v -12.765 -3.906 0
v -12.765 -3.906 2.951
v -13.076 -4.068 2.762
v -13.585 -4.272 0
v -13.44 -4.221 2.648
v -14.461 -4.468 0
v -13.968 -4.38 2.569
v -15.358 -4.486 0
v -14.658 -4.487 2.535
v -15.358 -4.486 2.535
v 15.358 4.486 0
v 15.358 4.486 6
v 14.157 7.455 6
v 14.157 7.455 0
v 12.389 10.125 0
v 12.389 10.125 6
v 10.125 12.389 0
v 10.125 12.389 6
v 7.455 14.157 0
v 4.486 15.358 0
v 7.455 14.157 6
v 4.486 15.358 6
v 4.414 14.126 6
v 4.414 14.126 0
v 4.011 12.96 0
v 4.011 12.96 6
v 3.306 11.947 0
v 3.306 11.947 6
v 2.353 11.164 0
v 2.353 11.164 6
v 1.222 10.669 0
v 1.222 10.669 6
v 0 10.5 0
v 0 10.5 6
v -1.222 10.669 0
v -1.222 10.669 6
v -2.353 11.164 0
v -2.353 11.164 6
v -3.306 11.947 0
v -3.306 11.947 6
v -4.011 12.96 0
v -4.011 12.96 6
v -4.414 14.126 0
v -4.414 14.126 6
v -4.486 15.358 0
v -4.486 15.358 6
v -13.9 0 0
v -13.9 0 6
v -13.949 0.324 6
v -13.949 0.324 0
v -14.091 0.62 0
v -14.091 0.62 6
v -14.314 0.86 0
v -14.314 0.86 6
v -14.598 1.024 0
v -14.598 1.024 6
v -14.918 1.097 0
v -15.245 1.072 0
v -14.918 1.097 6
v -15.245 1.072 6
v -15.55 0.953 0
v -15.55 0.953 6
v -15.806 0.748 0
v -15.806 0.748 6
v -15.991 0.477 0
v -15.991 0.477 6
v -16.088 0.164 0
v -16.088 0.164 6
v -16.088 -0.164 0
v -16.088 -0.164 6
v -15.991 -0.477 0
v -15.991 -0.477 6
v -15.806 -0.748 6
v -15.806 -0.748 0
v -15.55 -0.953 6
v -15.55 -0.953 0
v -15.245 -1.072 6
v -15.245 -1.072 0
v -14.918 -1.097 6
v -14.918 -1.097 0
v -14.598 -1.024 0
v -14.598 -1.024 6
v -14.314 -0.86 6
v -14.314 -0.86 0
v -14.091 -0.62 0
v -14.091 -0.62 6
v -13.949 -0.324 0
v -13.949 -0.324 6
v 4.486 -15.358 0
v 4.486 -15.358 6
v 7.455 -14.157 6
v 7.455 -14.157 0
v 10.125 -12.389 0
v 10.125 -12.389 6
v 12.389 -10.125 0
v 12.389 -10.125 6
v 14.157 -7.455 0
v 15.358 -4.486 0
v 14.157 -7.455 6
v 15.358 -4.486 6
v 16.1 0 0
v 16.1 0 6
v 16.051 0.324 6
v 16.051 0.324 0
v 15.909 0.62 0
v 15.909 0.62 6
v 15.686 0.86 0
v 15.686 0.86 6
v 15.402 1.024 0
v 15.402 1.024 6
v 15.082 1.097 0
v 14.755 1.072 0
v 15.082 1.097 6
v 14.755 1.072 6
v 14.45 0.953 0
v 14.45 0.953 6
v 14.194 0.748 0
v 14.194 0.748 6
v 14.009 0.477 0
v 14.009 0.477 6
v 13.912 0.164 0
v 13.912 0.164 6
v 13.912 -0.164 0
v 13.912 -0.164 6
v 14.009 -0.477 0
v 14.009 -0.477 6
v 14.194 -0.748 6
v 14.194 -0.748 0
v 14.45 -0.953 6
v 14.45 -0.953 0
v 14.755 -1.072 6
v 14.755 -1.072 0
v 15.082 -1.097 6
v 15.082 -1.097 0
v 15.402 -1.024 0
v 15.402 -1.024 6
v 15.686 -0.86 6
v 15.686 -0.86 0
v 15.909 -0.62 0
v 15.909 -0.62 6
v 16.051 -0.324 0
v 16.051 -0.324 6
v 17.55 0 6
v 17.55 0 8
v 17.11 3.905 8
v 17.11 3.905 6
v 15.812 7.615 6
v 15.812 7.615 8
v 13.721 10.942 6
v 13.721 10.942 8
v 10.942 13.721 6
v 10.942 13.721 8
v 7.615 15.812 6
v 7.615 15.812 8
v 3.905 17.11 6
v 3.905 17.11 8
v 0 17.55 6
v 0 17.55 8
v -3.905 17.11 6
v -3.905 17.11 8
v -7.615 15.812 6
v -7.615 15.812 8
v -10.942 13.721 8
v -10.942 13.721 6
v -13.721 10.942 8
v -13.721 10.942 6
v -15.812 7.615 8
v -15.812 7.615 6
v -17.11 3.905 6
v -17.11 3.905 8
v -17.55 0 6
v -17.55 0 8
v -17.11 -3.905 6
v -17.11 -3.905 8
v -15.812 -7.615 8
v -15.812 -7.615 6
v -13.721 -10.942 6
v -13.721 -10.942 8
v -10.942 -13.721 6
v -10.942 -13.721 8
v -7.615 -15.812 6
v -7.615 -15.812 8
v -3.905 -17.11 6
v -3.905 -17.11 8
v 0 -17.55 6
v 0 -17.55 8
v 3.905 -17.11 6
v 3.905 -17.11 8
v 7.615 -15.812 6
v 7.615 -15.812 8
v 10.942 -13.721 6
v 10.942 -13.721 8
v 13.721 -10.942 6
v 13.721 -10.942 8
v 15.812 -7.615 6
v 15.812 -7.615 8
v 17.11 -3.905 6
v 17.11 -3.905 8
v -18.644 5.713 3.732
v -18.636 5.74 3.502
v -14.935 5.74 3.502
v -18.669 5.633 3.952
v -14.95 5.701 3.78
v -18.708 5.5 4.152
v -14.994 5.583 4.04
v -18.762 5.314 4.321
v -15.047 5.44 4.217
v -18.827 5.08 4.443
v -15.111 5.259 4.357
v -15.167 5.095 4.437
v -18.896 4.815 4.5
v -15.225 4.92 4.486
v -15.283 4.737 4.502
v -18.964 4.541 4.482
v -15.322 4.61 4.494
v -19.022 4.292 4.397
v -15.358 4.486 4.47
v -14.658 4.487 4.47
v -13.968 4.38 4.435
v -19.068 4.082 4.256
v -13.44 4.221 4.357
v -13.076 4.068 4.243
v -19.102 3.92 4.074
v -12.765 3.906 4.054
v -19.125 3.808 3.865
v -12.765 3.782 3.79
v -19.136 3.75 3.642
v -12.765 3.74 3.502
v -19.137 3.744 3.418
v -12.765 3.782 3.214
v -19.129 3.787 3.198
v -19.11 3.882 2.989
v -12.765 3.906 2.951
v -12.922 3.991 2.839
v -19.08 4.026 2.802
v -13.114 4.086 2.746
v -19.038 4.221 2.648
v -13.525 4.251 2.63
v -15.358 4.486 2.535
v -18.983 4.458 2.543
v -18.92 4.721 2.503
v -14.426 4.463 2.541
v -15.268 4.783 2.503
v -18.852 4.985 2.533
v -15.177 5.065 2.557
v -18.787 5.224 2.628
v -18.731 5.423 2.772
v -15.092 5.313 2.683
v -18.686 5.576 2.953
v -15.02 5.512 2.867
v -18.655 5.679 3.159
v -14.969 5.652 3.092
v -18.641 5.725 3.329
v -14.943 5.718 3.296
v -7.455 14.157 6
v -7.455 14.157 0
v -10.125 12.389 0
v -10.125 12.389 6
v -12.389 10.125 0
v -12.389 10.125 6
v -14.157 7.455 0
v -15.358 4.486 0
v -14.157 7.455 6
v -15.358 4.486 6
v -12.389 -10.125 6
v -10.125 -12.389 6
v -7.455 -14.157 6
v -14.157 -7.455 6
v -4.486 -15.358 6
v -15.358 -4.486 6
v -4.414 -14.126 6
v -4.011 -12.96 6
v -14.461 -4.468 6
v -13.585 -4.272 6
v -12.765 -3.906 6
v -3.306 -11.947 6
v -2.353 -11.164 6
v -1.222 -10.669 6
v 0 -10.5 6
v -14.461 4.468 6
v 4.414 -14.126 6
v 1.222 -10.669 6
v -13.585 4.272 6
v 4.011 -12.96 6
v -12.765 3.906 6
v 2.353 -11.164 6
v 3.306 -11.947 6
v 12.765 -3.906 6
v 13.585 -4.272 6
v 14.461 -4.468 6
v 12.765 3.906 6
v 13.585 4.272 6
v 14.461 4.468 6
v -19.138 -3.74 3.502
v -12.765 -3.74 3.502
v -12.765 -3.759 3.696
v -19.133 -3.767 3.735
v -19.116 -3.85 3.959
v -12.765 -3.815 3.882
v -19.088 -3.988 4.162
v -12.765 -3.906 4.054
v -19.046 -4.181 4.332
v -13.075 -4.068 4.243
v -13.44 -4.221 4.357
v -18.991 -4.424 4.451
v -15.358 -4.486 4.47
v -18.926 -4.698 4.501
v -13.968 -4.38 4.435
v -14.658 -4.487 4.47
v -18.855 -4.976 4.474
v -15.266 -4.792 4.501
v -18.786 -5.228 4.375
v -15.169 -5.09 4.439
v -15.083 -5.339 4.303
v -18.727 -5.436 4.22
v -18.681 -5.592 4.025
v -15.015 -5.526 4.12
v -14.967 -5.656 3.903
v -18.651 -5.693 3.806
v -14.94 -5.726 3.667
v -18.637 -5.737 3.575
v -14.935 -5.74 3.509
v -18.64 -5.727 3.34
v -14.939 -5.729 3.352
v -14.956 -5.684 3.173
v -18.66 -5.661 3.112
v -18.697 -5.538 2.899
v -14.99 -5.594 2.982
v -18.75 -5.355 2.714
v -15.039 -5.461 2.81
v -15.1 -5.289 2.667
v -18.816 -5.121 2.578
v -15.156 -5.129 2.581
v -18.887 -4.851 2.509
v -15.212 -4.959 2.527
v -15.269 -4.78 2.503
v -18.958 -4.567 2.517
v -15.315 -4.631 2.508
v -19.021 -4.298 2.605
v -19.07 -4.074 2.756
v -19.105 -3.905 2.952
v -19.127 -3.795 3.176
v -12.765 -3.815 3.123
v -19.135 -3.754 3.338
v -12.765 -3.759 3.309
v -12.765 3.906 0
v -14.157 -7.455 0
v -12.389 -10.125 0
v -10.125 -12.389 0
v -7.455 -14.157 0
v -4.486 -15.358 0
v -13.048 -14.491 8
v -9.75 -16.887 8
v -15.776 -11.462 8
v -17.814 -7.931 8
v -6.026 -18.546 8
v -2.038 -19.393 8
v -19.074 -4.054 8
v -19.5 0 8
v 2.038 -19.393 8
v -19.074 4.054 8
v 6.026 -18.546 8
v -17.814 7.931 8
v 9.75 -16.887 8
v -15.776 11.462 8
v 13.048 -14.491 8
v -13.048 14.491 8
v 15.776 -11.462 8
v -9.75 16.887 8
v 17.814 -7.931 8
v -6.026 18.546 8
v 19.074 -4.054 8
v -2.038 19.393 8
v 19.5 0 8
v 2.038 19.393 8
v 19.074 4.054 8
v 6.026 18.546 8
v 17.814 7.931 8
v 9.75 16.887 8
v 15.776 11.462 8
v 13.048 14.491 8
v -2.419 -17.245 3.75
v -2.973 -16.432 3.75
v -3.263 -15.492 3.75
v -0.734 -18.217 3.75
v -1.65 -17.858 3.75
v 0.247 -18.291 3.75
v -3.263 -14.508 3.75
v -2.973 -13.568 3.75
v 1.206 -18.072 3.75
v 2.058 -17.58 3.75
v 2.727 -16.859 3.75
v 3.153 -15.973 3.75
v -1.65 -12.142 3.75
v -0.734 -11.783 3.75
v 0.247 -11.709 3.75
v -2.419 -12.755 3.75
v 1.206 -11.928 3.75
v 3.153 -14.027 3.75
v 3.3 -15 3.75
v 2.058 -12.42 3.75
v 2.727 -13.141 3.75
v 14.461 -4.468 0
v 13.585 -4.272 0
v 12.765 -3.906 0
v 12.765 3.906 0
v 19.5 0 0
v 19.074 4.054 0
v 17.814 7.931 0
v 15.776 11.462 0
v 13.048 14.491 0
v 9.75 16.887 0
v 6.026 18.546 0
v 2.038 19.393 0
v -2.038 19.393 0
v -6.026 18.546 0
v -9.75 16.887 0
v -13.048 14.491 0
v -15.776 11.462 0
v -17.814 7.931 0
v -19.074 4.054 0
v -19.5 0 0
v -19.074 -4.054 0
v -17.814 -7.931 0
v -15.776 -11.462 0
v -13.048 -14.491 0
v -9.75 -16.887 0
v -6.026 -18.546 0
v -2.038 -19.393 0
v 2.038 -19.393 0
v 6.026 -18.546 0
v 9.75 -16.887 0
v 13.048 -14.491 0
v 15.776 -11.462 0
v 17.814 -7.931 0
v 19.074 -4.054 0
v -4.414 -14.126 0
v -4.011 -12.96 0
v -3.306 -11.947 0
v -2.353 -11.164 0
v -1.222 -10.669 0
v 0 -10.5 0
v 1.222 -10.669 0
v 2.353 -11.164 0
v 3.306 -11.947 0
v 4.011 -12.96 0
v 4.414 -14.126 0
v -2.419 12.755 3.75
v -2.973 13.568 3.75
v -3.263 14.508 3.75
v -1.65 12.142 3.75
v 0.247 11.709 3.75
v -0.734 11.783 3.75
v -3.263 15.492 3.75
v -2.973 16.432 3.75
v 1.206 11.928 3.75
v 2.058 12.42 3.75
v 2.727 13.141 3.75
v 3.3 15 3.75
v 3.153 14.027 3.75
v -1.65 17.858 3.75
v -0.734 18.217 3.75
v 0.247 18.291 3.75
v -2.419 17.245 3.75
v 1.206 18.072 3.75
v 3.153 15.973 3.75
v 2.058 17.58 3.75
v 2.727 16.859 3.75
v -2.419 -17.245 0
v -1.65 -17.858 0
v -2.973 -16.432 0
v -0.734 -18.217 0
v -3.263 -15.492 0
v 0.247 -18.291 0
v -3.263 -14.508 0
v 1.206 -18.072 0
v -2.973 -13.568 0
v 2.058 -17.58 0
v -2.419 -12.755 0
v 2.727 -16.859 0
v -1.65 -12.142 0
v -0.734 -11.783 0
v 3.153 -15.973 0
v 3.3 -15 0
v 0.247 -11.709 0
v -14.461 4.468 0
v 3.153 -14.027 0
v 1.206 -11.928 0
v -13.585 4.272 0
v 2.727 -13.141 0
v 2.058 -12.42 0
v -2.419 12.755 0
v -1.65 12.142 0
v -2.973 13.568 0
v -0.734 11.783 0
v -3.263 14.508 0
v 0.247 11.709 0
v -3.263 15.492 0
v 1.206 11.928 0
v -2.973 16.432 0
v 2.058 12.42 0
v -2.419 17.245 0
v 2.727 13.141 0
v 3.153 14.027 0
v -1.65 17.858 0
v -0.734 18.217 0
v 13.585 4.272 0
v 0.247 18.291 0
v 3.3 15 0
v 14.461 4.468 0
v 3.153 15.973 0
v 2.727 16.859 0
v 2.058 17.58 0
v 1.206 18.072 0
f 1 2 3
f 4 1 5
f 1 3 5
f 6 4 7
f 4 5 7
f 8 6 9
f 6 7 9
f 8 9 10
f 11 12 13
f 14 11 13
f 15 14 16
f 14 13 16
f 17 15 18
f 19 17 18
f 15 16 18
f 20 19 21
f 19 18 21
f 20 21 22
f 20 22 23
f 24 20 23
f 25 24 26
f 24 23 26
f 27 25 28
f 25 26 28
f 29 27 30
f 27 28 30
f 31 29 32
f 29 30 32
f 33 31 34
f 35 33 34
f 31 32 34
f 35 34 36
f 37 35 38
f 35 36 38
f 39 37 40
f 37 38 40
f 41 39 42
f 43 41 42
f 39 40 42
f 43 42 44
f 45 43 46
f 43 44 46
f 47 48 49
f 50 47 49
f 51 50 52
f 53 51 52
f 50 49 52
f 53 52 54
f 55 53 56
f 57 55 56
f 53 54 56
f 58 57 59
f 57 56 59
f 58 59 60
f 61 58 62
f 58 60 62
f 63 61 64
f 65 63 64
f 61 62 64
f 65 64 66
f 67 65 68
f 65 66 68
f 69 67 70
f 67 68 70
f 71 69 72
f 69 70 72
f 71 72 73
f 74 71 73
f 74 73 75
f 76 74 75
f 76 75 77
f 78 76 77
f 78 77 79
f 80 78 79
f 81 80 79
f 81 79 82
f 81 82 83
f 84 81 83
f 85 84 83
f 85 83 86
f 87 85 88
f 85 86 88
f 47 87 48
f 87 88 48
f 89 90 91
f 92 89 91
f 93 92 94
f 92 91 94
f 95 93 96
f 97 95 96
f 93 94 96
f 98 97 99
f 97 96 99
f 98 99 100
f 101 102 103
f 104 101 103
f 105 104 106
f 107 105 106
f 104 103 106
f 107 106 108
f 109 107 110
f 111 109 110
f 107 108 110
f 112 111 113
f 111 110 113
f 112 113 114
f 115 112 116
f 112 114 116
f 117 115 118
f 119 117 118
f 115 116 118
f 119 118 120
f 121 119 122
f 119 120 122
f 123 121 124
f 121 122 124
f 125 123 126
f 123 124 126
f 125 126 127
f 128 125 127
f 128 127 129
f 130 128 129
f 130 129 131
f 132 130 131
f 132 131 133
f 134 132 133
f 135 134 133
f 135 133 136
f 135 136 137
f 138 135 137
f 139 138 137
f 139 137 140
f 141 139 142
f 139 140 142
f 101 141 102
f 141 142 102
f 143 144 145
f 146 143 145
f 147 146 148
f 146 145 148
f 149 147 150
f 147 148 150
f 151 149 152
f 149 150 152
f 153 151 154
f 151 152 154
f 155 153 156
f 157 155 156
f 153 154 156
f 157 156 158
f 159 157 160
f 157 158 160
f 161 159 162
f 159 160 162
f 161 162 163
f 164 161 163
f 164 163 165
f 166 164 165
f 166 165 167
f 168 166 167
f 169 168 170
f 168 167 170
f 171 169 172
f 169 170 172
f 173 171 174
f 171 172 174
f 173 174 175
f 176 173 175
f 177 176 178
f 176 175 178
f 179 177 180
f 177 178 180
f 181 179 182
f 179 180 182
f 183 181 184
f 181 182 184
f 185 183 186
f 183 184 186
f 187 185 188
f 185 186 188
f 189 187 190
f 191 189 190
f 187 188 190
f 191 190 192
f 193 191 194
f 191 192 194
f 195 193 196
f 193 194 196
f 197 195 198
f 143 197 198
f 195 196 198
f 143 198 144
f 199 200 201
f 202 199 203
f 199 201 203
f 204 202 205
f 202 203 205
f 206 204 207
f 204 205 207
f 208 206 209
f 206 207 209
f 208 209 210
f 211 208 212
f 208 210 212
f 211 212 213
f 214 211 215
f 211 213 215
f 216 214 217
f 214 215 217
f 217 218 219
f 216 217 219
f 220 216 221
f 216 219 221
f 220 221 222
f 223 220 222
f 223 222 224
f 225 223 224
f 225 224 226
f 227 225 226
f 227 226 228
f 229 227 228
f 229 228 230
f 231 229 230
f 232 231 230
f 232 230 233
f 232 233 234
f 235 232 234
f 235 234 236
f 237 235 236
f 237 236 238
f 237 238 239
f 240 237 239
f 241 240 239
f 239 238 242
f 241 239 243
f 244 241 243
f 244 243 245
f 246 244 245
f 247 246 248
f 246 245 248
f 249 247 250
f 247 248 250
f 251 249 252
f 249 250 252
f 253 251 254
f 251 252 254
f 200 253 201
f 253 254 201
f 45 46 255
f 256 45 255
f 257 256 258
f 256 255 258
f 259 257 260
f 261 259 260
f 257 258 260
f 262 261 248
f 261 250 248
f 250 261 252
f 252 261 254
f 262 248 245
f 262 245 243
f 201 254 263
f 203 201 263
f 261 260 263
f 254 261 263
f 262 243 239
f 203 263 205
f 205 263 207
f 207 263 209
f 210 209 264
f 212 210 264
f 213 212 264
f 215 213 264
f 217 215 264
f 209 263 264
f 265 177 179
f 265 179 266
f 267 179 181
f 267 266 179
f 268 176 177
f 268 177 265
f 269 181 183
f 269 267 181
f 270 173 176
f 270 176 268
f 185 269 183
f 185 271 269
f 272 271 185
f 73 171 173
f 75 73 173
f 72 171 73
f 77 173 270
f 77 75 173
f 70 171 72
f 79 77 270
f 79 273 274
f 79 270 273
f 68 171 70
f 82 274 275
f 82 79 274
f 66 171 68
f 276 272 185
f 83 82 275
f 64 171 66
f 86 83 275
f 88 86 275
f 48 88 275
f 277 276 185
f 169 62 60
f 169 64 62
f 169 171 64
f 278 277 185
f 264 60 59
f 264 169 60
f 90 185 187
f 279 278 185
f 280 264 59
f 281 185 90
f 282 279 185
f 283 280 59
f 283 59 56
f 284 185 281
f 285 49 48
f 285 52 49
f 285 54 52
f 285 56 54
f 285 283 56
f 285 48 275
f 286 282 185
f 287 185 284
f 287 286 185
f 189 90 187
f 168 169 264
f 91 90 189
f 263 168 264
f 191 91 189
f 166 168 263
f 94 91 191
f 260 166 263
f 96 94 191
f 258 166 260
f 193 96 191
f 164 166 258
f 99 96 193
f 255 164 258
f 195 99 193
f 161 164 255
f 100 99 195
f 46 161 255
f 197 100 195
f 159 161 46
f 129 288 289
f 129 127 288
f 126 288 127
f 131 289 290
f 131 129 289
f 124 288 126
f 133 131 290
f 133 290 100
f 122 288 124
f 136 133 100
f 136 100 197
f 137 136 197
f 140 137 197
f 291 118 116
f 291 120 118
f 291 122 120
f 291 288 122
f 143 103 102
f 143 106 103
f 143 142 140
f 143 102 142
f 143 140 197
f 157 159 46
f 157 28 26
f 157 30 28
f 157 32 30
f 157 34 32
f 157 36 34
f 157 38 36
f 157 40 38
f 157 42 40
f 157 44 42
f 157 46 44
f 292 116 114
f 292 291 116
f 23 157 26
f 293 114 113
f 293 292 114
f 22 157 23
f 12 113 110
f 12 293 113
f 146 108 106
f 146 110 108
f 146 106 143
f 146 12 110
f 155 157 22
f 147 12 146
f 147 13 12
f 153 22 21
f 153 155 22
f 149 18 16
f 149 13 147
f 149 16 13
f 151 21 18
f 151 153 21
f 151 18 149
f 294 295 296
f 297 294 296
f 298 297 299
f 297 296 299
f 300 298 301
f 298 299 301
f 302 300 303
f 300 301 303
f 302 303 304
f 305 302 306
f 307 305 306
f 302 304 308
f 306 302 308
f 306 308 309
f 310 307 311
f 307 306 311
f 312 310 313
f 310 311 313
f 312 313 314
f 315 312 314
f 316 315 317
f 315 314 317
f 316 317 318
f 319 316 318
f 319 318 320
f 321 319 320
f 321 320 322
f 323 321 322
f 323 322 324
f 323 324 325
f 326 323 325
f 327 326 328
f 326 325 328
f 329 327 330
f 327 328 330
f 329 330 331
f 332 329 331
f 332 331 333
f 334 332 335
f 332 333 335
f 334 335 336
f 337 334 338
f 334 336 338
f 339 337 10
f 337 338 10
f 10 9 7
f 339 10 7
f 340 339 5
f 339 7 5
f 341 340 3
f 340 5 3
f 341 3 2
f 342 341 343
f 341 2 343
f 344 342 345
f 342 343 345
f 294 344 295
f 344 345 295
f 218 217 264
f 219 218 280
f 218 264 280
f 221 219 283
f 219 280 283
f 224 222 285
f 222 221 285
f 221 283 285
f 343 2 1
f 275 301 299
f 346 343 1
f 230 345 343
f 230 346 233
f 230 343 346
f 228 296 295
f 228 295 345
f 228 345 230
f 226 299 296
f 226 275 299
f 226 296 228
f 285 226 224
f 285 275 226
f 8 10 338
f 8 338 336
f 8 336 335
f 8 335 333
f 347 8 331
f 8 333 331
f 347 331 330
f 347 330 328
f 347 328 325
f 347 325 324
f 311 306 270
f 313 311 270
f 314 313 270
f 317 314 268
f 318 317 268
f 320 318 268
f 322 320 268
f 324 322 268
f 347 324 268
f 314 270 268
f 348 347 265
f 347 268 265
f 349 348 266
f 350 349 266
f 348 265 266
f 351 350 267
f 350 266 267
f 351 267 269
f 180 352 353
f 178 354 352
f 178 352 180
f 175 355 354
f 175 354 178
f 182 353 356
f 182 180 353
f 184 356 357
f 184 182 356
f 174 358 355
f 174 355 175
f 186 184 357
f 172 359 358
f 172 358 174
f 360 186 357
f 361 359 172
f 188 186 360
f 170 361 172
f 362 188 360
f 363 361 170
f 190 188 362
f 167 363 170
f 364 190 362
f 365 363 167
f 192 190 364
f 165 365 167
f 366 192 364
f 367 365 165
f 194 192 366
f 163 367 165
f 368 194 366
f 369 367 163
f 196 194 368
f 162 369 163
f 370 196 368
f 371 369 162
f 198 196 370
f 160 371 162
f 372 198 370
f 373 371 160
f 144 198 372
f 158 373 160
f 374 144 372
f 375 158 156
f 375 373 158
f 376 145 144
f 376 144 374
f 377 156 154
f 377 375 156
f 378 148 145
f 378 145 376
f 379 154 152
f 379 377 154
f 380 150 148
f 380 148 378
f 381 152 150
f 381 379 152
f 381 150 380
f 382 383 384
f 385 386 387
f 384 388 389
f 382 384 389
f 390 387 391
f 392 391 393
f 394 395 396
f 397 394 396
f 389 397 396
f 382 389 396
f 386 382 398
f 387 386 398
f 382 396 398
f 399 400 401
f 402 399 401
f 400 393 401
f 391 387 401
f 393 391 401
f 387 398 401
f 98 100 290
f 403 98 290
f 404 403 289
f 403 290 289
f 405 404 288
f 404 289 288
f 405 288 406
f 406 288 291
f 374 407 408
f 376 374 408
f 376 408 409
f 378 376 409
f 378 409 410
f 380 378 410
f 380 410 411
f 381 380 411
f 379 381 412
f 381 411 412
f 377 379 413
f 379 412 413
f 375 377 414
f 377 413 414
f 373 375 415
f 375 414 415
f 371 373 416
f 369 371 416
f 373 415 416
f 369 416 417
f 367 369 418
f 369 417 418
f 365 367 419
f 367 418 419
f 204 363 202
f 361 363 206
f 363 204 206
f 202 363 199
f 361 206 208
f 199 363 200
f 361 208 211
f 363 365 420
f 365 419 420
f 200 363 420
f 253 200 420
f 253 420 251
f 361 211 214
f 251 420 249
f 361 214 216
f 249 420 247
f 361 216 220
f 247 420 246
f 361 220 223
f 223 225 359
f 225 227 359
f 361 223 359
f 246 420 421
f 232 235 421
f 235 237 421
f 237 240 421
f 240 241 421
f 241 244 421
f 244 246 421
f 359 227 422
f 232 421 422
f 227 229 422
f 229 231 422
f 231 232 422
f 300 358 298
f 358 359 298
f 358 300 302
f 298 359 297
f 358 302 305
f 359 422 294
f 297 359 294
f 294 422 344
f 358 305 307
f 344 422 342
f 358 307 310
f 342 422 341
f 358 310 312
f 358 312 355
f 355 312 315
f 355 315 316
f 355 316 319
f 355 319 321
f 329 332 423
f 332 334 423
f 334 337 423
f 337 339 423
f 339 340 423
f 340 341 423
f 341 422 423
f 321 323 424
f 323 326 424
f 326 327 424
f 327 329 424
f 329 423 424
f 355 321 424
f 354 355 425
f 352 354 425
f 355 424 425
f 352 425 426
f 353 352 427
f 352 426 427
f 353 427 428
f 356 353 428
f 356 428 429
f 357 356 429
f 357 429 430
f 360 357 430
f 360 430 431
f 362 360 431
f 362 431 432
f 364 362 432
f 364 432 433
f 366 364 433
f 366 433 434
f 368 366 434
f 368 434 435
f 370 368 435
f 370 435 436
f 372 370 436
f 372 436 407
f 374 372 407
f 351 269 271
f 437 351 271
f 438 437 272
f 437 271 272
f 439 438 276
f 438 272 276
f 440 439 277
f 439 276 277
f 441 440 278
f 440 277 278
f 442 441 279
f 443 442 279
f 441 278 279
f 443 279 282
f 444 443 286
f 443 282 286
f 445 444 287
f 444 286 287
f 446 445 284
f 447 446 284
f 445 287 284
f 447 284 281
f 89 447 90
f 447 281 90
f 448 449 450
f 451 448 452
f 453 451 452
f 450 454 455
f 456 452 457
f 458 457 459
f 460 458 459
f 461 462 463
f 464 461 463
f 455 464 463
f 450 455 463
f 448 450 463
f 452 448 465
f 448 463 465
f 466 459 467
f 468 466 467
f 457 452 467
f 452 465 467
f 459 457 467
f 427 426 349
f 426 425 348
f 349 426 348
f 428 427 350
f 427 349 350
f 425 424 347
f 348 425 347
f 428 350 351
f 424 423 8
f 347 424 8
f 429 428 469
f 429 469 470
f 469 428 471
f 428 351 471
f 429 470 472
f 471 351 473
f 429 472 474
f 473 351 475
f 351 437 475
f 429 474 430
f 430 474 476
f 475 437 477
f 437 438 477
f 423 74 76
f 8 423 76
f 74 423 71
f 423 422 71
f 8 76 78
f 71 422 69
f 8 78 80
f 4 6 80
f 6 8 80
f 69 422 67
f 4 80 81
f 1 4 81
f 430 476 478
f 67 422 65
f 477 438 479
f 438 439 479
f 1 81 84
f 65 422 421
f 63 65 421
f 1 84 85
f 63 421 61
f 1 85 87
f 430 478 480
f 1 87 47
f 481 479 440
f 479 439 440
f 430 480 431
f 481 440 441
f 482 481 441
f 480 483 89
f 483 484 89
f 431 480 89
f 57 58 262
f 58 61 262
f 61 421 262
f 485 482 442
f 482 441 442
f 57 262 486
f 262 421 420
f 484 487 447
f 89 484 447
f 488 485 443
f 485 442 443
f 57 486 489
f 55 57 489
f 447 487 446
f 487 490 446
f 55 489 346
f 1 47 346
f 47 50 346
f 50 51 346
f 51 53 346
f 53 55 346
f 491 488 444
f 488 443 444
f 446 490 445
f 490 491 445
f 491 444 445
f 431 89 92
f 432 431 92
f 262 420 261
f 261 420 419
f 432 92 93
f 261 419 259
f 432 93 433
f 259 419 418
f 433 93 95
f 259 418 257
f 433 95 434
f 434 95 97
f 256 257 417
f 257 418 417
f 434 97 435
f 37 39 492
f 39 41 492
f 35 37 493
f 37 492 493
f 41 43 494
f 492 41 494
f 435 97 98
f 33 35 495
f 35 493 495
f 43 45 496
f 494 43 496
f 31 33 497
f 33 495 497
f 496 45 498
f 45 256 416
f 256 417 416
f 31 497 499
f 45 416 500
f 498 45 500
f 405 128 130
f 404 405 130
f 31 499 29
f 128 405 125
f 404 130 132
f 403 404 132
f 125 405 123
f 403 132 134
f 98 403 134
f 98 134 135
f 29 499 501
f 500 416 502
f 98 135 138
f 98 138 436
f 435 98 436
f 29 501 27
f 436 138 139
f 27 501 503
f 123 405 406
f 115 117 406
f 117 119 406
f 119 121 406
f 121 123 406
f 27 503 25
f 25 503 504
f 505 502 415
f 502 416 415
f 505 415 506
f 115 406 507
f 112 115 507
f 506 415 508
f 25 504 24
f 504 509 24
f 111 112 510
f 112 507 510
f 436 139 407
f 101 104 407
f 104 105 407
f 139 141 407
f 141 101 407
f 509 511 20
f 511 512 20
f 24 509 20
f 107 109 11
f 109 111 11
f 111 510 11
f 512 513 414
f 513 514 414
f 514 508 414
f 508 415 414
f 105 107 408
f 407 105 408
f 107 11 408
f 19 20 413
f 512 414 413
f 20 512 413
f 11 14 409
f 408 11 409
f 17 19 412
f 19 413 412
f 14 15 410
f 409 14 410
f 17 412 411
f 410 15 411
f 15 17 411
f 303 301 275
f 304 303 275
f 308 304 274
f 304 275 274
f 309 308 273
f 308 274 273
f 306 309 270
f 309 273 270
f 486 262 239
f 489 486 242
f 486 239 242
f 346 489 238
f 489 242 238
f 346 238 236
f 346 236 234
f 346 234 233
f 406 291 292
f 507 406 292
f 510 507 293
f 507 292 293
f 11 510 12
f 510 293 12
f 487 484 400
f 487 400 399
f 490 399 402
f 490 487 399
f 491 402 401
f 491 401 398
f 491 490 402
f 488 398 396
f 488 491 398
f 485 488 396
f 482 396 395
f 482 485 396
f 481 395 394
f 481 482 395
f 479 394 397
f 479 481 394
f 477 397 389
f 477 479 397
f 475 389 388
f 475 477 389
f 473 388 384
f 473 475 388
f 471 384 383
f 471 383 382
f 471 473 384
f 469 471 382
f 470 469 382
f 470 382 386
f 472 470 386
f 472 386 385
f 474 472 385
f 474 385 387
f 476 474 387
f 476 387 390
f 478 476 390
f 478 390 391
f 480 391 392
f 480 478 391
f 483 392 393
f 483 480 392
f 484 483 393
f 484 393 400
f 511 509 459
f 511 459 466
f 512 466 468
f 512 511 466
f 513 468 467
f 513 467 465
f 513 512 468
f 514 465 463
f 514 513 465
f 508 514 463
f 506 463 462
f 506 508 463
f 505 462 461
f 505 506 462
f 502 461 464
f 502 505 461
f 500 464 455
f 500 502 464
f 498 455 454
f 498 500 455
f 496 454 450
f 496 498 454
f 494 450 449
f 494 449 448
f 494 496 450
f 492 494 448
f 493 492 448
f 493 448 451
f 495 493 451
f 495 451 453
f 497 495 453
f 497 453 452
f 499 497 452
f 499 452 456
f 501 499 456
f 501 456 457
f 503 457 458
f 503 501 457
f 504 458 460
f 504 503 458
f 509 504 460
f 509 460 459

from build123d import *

# Parameters (mm, degrees)
F0_R      = 19.5
F1_DEPTH  = 8
F2_R      = 17.55
F3_DEPTH  = 2
F5_DEPTH  = 6
F6_R      = 1.1
F7_DEPTH  = 6
F8_R      = 3.3
F9_DEPTH  = 3.75
F10_R     = 1
F11_DEPTH = 25
F12_W     = 3.246098
F12_H     = 10.70335
F13_DEPTH = 6


with BuildPart() as f1:
    # F0 (on Top) → F1 (new body)
    with BuildSketch(Plane.XY):
        Circle(F0_R)
    extrude(amount=F1_DEPTH)

    # F2 (on face) → F3 (cut)
    with BuildSketch(Plane.XY.offset(8)):
        Circle(F2_R)
    extrude(amount=-F3_DEPTH, mode=Mode.SUBTRACT)

    # F4 (on face) → F5 (cut)
    with BuildSketch(Plane.XY.offset(6)):
        with BuildLine():
            ThreePointArc((15.358333, -4.48571), (10.5, 0), (15.358333, 4.48571))
            ThreePointArc((15.358333, 4.48571), (11.313708, 11.313708), (4.48571, 15.358333))
            ThreePointArc((4.48571, 15.358333), (0, 10.5), (-4.48571, 15.358333))
            ThreePointArc((-4.48571, 15.358333), (-11.313708, 11.313708), (-15.358333, 4.48571))
            ThreePointArc((-15.358333, 4.48571), (-10.5, 0), (-15.358333, -4.48571))
            ThreePointArc((-15.358333, -4.48571), (-11.313708, -11.313708), (-4.48571, -15.358333))
            ThreePointArc((-4.48571, -15.358333), (0, -10.5), (4.48571, -15.358333))
            ThreePointArc((4.48571, -15.358333), (11.313708, -11.313708), (15.358333, -4.48571))
        make_face()
    extrude(amount=-F5_DEPTH, mode=Mode.SUBTRACT)

    # F6 (on face) → F7 (cut)
    with BuildSketch(Plane.XY.offset(6)):
        with Locations((-15, 0)):
            Circle(F6_R)
        with Locations((15, 0)):
            Circle(F6_R)
    extrude(amount=-F7_DEPTH, mode=Mode.SUBTRACT)

    # F8 (on Top) → F9 (cut)
    with BuildSketch(Plane.XY):
        with Locations((0, 15)):
            Circle(F8_R)
        with Locations((0, -15)):
            Circle(F8_R)
    extrude(amount=F9_DEPTH, mode=Mode.SUBTRACT)

    # F10 (on Right) → F11 (cut)
    with BuildSketch(Plane.YZ):
        with Locations((-4.74, 3.502372)):
            Circle(F10_R)
        with Locations((4.74, 3.502372)):
            Circle(F10_R)
    extrude(amount=-F11_DEPTH, mode=Mode.SUBTRACT)

    # F12 (on face) → F13 (cut)
    with BuildSketch(Plane.XY.offset(6)):
        with Locations((-11.142012, -0.109914)):
            Rectangle(F12_W, F12_H)
        with Locations((11.142012, -0.109914)):
            Rectangle(F12_W, F12_H)
    extrude(amount=-F13_DEPTH, mode=Mode.SUBTRACT)


solid = f1.part
